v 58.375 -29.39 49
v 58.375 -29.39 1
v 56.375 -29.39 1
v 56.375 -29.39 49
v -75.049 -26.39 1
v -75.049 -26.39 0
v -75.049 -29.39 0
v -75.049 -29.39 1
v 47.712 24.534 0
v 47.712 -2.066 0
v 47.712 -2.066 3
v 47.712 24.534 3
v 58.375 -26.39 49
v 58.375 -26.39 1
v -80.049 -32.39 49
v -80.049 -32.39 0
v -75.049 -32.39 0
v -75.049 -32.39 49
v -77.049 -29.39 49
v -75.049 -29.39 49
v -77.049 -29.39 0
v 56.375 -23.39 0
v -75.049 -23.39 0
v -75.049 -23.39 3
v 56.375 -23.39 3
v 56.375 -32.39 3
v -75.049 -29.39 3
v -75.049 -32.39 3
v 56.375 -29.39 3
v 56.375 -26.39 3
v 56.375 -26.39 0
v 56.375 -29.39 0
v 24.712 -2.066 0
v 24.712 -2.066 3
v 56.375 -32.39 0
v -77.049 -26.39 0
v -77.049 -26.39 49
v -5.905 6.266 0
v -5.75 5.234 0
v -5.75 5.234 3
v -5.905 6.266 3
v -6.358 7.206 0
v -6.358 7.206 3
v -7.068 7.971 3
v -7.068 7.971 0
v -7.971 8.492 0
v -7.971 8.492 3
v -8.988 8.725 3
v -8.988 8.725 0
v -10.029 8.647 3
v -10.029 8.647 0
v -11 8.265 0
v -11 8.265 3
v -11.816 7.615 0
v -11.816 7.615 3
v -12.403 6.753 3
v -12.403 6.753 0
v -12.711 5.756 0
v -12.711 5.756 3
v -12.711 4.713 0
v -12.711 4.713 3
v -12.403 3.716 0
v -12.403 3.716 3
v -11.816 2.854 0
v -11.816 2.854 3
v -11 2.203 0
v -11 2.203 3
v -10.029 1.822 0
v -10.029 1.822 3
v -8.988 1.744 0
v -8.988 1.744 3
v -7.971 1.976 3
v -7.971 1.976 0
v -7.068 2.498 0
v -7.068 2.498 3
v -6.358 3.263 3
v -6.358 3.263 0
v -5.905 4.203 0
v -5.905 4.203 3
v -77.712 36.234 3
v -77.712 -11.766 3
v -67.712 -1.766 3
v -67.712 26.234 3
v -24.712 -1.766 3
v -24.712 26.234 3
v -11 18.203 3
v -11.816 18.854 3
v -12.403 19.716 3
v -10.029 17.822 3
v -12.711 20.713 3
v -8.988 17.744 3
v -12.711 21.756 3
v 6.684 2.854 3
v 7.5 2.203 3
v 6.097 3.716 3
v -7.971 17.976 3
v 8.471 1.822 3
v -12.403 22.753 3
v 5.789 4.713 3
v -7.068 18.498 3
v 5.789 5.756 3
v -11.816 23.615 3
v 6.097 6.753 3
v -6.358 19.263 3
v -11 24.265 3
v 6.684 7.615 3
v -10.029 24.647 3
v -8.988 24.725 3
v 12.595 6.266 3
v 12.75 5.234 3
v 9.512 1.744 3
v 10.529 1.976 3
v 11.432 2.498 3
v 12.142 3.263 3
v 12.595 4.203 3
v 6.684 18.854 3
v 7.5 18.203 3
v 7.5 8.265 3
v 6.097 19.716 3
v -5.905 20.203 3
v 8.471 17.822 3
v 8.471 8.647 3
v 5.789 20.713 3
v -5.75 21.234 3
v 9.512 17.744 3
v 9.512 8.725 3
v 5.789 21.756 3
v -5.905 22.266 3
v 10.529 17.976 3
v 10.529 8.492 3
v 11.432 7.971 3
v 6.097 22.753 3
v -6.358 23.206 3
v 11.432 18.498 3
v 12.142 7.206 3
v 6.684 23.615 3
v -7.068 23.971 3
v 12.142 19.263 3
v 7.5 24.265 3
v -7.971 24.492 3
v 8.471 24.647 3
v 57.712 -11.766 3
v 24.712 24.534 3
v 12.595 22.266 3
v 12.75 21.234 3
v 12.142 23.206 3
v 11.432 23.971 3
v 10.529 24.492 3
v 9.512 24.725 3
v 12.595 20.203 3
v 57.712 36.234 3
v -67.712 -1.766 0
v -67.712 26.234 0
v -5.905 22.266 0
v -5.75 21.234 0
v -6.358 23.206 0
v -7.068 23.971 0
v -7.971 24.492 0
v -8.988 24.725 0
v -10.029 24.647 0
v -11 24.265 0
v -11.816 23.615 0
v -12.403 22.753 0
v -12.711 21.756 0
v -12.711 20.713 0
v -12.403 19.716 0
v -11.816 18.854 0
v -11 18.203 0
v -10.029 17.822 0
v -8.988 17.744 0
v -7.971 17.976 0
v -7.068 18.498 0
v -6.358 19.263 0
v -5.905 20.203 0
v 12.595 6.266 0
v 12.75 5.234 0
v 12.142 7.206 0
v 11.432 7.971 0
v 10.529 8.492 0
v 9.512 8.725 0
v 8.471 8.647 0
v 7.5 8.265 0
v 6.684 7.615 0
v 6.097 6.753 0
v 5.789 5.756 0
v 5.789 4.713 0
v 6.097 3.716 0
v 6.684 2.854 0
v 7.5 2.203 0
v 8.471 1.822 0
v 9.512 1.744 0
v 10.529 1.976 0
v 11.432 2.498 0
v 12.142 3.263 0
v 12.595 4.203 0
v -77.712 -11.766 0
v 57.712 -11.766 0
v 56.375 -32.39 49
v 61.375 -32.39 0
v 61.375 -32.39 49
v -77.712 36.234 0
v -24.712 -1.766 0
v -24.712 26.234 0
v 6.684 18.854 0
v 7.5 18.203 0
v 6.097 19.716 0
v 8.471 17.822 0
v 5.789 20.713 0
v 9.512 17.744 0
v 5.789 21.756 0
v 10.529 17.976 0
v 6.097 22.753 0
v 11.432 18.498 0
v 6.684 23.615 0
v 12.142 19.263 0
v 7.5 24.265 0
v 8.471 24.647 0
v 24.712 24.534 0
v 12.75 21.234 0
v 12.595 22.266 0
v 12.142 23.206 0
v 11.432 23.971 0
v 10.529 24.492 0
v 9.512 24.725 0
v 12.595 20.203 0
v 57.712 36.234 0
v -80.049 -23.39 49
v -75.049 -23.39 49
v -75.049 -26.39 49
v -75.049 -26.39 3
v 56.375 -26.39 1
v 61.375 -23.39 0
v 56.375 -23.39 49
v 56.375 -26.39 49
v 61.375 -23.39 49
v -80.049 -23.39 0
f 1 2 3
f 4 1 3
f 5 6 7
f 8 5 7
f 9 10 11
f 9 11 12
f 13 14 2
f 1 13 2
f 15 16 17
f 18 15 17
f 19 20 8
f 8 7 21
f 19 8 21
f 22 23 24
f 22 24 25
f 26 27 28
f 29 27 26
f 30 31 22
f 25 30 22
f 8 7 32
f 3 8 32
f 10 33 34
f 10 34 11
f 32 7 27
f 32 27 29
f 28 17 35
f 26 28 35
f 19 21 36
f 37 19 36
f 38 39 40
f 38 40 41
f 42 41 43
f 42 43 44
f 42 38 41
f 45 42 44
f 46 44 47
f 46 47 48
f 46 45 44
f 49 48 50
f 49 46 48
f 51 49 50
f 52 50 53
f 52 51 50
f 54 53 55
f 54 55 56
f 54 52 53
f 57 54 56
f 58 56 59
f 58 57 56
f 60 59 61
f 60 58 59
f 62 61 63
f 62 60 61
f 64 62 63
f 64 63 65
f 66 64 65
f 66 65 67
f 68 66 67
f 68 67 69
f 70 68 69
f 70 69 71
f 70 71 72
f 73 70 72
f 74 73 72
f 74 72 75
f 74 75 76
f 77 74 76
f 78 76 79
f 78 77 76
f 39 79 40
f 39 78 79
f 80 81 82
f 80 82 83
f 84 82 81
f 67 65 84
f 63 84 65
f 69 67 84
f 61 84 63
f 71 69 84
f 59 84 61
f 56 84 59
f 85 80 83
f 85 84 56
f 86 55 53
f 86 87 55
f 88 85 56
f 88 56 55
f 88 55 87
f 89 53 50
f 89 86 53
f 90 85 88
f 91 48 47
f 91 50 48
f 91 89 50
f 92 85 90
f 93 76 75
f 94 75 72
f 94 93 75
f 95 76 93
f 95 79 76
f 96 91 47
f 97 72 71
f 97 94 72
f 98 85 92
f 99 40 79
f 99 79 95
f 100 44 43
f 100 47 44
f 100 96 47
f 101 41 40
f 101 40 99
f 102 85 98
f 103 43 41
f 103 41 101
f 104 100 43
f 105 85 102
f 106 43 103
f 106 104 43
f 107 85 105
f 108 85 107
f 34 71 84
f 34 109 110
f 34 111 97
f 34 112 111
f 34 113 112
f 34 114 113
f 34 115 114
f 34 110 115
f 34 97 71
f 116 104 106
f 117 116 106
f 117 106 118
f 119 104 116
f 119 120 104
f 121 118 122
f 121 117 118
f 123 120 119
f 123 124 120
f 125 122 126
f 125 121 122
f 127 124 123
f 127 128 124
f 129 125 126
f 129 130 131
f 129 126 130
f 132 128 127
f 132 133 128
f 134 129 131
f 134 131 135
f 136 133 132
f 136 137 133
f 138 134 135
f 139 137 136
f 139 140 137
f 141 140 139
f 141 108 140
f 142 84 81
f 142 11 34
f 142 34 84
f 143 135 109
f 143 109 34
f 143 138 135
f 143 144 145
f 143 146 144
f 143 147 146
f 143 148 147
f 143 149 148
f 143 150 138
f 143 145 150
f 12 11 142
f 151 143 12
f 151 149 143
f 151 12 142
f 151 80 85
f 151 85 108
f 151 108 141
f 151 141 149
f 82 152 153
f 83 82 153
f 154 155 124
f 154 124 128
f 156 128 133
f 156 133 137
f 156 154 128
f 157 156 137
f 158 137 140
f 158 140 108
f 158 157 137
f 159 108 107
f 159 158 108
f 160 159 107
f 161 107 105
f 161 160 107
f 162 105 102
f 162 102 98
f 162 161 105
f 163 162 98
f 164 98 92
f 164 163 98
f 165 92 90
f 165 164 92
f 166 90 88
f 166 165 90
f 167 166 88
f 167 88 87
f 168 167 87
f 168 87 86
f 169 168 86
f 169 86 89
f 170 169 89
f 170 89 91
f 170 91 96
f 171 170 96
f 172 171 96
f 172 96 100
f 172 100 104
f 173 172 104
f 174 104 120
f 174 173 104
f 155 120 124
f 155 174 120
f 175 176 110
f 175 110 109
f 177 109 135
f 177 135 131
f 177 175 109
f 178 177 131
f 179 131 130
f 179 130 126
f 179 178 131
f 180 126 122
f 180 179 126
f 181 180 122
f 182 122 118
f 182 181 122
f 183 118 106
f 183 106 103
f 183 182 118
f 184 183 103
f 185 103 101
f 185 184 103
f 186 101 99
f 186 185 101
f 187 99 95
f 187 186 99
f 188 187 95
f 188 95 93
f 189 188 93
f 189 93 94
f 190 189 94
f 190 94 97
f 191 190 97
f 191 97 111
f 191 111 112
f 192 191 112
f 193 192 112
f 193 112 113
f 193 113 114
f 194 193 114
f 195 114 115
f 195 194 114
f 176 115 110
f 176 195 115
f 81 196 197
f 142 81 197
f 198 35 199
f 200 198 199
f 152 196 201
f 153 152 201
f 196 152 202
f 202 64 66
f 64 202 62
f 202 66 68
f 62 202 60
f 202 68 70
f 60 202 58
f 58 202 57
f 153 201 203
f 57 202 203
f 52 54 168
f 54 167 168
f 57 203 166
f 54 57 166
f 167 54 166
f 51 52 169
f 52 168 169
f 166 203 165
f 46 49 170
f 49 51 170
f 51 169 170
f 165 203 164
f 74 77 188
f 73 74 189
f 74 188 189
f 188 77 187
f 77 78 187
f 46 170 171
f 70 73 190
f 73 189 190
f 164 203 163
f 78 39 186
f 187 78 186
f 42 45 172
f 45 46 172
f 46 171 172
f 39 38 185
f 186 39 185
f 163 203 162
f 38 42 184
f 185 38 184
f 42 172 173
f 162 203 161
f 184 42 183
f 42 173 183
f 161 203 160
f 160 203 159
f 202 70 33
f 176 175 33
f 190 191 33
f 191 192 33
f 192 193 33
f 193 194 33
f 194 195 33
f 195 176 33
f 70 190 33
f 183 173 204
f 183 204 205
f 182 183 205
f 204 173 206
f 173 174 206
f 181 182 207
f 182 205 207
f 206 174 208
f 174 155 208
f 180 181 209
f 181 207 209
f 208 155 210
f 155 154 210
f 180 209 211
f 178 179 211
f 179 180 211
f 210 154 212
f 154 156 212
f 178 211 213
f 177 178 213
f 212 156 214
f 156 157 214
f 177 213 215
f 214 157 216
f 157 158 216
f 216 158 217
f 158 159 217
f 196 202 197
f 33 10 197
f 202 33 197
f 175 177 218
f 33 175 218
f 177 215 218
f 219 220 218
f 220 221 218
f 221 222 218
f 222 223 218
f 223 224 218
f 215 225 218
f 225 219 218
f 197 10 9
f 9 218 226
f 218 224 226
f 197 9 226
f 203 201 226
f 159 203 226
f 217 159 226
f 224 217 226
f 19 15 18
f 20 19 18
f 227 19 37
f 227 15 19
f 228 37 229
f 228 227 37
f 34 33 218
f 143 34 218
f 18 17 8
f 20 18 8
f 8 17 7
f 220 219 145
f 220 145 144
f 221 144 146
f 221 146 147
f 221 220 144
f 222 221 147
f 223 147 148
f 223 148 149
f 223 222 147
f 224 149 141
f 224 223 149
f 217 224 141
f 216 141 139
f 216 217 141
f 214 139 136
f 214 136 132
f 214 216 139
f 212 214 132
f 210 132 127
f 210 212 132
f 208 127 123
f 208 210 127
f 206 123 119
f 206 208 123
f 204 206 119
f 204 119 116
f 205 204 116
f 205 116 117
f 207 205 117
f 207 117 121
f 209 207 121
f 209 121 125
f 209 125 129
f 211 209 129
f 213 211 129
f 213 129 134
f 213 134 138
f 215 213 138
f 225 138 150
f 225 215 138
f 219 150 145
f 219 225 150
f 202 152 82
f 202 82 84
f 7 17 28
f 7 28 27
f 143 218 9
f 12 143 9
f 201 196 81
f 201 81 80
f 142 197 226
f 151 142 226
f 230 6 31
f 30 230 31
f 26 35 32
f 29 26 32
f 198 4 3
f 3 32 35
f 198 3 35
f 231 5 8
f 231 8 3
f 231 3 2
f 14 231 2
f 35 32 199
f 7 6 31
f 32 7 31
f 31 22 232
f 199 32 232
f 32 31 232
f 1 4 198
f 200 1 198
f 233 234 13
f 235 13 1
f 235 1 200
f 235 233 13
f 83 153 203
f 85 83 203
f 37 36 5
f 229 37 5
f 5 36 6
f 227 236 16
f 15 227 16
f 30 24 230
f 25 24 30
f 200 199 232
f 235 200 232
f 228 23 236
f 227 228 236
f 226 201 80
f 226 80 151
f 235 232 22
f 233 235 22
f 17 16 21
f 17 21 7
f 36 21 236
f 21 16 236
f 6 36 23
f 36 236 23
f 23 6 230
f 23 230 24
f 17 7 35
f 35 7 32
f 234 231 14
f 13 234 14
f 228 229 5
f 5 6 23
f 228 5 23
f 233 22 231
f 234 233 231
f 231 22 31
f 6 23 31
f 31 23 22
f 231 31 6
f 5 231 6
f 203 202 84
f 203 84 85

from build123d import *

# Parameters (mm, degrees)
F0_W     = 135.424095
F0_H     = 48
F0_W_2   = 43
F0_H_2   = 28
F0_R     = 3.5
F0_W_3   = 23
F0_H_3   = 26.6
F1_DEPTH = 3
F2_DEPTH = 49
F3_DEPTH = 1
F0_W_4   = 131.424
F0_H_4   = 3
F4_DEPTH = 3


with BuildPart() as f1:
    # F0 (on Top) → F1 (new body)
    with BuildSketch(Plane.XY):
        with Locations((-10.000047, 12.234408)):
            Rectangle(F0_W, F0_H)
        with Locations((-46.212095, 12.234408)):
            Rectangle(F0_W_2, F0_H_2, mode=Mode.SUBTRACT)
        with Locations((-9.25, 5.234408)):
            Circle(F0_R, mode=Mode.SUBTRACT)
        with Locations((9.25, 5.234408)):
            Circle(F0_R, mode=Mode.SUBTRACT)
        with Locations((36.212, 11.234408)):
            Rectangle(F0_W_3, F0_H_3, mode=Mode.SUBTRACT)
        with Locations((-9.25, 21.234408)):
            Circle(F0_R, mode=Mode.SUBTRACT)
        with Locations((9.25, 21.234408)):
            Circle(F0_R, mode=Mode.SUBTRACT)
    extrude(amount=F1_DEPTH)


with BuildPart() as f2:
    # F0 (on Top) → F2 (new body)
    with BuildSketch(Plane.XY):
        Polygon((56.374789, -23.389696), (56.374789, -26.389696), (58.374789, -26.389696), (58.374789, -29.389696), (56.374789, -29.389696), (56.374789, -32.389696), (58.374789, -32.389696), (61.374789, -32.389696), (61.374789, -23.389696), (58.374789, -23.389696), align=None)
        Polygon((-77.049211, -29.389696), (-77.049211, -26.389696), (-75.049211, -26.389696), (-75.049211, -23.389696), (-77.049211, -23.389696), (-80.049211, -23.389696), (-80.049211, -32.389696), (-77.049211, -32.389696), (-75.049211, -32.389696), (-75.049211, -29.389696), align=None)
    extrude(amount=F2_DEPTH)

    # F0 (on Top) → F3 (join)
    with BuildSketch(Plane.XY):
        Polygon((56.374789, -26.389696), (-75.049211, -26.389696), (-75.049211, -29.389696), (56.374789, -29.389696), (58.374789, -29.389696), (58.374789, -26.389696), align=None)
    extrude(amount=F3_DEPTH)


with BuildPart() as f4:
    # F0 (on Top) → F4 (new body)
    with BuildSketch(Plane.XY):
        with Locations((-9.337211, -30.889696)):
            Rectangle(F0_W_4, F0_H_4)
        with Locations((-9.337211, -24.889696)):
            Rectangle(F0_W_4, F0_H_4)
    extrude(amount=F4_DEPTH)


solid = Compound([f1.part, f2.part, f4.part])
